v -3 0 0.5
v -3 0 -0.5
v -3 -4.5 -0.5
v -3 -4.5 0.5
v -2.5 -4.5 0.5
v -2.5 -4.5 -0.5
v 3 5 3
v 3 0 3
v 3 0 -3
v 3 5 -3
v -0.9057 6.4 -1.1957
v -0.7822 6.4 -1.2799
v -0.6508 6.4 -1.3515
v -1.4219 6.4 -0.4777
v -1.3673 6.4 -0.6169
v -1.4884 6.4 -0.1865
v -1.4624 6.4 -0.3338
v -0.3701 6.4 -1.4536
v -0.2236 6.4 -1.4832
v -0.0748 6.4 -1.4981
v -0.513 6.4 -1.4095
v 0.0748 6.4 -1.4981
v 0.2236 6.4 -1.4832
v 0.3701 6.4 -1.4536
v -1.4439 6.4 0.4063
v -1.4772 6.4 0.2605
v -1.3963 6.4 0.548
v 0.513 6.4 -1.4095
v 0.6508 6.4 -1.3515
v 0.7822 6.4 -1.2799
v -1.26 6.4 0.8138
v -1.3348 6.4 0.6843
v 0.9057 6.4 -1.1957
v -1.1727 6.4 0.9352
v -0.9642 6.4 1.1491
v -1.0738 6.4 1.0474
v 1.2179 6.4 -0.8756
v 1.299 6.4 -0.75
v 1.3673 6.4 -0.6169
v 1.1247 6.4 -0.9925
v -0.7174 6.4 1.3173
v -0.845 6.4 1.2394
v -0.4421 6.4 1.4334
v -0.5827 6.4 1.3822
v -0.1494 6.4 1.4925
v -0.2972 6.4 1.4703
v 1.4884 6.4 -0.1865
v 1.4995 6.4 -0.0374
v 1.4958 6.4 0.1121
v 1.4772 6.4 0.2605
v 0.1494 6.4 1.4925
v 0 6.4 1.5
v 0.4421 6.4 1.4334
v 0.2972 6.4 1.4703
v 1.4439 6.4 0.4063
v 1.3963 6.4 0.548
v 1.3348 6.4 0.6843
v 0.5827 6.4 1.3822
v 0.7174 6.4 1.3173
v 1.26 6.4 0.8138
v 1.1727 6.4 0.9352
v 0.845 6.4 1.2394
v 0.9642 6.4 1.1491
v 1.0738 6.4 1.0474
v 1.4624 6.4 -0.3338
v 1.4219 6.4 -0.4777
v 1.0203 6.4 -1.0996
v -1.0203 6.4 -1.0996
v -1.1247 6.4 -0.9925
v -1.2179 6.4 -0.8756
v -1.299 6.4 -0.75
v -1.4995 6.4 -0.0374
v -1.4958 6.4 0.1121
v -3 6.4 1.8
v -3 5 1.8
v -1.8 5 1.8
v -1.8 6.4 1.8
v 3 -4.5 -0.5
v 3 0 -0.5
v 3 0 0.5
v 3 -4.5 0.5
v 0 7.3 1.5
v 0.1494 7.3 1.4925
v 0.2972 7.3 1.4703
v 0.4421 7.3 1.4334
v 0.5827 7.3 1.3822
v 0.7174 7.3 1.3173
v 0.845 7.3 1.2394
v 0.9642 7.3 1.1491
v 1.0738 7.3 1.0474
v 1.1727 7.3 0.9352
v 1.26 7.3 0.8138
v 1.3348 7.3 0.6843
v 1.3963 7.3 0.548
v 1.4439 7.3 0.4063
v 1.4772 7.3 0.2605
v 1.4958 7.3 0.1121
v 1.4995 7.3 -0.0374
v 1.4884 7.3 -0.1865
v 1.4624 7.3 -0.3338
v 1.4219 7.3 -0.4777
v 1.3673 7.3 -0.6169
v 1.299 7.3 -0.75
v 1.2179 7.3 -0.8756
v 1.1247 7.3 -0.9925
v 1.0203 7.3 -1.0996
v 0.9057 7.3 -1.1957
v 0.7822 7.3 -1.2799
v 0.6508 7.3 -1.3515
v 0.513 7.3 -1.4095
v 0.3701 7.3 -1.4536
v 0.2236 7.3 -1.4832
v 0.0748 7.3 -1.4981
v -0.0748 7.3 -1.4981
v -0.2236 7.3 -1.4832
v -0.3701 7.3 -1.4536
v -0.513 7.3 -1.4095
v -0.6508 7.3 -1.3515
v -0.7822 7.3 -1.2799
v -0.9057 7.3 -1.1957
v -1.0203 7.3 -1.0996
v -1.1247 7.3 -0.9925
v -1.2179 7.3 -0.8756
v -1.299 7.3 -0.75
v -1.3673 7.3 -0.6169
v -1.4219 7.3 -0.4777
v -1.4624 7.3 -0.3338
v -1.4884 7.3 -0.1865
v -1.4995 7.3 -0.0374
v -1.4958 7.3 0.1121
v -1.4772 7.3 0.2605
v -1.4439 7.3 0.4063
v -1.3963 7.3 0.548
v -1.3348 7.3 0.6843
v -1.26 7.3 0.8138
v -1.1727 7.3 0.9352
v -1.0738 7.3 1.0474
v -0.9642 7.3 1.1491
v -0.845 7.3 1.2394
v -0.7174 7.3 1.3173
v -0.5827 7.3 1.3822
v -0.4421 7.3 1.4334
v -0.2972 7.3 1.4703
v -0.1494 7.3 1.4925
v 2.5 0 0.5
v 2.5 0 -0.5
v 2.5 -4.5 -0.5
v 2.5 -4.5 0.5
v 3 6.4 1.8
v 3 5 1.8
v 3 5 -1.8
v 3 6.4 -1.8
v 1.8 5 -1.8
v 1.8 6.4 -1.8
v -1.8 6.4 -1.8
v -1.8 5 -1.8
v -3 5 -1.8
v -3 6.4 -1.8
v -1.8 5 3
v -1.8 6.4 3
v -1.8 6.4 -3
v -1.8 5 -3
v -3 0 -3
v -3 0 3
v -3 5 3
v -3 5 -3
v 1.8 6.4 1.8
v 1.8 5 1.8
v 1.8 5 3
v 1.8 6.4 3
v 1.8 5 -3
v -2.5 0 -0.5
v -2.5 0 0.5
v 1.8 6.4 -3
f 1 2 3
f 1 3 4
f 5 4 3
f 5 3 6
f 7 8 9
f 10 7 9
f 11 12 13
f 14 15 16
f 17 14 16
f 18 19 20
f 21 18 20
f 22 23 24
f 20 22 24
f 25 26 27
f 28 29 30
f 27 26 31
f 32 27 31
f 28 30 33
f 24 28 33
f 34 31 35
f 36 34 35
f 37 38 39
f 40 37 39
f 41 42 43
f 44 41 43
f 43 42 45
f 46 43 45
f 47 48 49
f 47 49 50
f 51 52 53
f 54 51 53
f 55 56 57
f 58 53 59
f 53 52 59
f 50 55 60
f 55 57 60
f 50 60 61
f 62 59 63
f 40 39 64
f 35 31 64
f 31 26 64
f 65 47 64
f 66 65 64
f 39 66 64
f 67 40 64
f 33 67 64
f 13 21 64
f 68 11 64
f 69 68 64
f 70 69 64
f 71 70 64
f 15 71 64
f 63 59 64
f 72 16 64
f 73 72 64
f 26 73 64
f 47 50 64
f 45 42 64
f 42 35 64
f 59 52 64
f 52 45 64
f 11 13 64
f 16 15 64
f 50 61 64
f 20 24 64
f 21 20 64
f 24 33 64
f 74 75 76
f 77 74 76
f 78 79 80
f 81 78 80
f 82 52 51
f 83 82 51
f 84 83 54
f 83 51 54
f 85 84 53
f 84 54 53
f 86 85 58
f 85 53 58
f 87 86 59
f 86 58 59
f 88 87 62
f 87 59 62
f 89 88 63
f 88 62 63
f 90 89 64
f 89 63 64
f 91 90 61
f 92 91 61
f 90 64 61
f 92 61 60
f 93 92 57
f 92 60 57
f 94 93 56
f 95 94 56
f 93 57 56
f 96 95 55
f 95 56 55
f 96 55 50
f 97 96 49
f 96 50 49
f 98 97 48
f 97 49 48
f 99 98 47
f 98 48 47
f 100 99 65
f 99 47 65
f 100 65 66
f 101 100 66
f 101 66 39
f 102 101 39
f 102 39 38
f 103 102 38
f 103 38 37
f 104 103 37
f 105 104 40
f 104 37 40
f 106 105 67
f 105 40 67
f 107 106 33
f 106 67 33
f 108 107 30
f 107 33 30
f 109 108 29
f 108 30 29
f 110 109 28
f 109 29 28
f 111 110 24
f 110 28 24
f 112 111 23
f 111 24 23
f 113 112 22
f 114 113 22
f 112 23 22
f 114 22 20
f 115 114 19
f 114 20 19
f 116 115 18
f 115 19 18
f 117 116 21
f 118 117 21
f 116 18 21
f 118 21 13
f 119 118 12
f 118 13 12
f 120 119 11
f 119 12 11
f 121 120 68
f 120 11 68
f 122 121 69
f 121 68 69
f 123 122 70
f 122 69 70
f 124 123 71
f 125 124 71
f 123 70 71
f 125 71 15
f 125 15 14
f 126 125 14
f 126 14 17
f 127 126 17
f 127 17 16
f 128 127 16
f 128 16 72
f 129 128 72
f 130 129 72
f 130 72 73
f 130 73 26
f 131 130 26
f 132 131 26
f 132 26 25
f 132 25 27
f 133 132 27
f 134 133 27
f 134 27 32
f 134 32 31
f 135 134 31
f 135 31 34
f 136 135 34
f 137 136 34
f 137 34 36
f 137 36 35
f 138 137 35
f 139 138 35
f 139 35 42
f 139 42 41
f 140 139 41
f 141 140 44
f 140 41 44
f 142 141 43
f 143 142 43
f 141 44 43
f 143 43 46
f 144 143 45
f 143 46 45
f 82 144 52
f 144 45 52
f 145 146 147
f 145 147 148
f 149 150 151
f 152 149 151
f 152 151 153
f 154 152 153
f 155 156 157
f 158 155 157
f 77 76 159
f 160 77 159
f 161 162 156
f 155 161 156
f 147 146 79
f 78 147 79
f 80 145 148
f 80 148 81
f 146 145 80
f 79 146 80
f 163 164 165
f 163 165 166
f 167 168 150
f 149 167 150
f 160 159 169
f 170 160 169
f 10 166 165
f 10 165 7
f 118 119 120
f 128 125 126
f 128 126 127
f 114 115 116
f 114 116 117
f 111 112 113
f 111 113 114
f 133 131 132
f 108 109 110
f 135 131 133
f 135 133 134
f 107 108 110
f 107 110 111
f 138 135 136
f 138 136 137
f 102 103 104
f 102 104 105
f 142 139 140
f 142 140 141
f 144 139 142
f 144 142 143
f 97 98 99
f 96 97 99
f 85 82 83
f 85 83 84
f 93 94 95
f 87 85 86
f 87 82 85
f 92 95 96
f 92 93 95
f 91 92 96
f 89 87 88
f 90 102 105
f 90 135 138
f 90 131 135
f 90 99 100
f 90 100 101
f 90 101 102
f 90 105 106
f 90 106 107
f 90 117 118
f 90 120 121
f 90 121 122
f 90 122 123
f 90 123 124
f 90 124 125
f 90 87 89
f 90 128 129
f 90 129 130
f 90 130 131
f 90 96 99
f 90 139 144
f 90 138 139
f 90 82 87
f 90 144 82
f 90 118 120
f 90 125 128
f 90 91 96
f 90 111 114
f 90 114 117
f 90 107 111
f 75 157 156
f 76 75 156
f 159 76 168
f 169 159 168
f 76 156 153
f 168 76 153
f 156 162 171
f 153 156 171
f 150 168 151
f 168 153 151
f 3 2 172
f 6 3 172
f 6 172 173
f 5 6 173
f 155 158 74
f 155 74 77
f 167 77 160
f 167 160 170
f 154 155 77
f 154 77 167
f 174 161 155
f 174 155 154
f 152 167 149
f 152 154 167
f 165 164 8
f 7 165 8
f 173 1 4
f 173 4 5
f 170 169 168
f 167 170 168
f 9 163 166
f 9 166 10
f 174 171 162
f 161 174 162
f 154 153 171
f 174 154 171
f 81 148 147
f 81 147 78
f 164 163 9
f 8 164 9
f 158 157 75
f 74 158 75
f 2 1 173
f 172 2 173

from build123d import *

# Parameters (mm, degrees)
SKETCH_1_W        = 6
SKETCH_1_H        = 6
EXTRUDE_1_DEPTH   = 5
EXTRUDE_2_DEPTH   = 1.4
SKETCH_4_R        = 1.5
EXTRUDE_3_DEPTH   = 0.9
SKETCH_5_W        = 0.5
SKETCH_5_H        = 1
EXTRUDE_4_DEPTH   = 4.5
EXTRUDE_4_2_DEPTH = 4.5


with BuildPart() as part:
    # 草图1 → 凸台-拉伸1 (new body)
    with BuildSketch(Plane(origin=(0, 0, 0), x_dir=(1, 0, 0), z_dir=(0, 1, 0))):
        Rectangle(SKETCH_1_W, SKETCH_1_H)
    extrude(amount=EXTRUDE_1_DEPTH)


with BuildPart() as body_2:
    # 草图3 → 凸台-拉伸2 (new body)
    with BuildSketch(Plane(origin=(0, 5, 0), x_dir=(1, 0, 0), z_dir=(0, 1, 0))):
        Polygon((1.8, 1.8), (1.8, 3), (-1.8, 3), (-1.8, 1.8), (-3, 1.8), (-3, -1.8), (-1.8, -1.8), (-1.8, -3), (1.8, -3), (1.8, -1.8), (3, -1.8), (3, 1.8), align=None)
    extrude(amount=EXTRUDE_2_DEPTH)


with BuildPart() as body_3:
    # 草图4 → 凸台-拉伸3 (new body)
    with BuildSketch(Plane(origin=(0, 6.4, 0), x_dir=(1, 0, 0), z_dir=(0, 1, 0))):
        with Locations(Location((0, 0, 0), (0, 0, 270))):
            Circle(SKETCH_4_R)
    extrude(amount=EXTRUDE_3_DEPTH)


with BuildPart() as body_4:
    # 草图5 → 凸台-拉伸4 (new body)
    with BuildSketch(Plane.XZ):
        with Locations((2.75, 0)):
            Rectangle(SKETCH_5_W, SKETCH_5_H)
    extrude(amount=EXTRUDE_4_DEPTH)


with BuildPart() as body_5:
    # 草图5 → Extrude 4 2 (new body)
    with BuildSketch(Plane.XZ):
        with Locations((-2.75, 0)):
            Rectangle(SKETCH_5_W, SKETCH_5_H)
    extrude(amount=EXTRUDE_4_2_DEPTH)


solid = Compound([part.part, body_2.part, body_3.part, body_4.part, body_5.part])
